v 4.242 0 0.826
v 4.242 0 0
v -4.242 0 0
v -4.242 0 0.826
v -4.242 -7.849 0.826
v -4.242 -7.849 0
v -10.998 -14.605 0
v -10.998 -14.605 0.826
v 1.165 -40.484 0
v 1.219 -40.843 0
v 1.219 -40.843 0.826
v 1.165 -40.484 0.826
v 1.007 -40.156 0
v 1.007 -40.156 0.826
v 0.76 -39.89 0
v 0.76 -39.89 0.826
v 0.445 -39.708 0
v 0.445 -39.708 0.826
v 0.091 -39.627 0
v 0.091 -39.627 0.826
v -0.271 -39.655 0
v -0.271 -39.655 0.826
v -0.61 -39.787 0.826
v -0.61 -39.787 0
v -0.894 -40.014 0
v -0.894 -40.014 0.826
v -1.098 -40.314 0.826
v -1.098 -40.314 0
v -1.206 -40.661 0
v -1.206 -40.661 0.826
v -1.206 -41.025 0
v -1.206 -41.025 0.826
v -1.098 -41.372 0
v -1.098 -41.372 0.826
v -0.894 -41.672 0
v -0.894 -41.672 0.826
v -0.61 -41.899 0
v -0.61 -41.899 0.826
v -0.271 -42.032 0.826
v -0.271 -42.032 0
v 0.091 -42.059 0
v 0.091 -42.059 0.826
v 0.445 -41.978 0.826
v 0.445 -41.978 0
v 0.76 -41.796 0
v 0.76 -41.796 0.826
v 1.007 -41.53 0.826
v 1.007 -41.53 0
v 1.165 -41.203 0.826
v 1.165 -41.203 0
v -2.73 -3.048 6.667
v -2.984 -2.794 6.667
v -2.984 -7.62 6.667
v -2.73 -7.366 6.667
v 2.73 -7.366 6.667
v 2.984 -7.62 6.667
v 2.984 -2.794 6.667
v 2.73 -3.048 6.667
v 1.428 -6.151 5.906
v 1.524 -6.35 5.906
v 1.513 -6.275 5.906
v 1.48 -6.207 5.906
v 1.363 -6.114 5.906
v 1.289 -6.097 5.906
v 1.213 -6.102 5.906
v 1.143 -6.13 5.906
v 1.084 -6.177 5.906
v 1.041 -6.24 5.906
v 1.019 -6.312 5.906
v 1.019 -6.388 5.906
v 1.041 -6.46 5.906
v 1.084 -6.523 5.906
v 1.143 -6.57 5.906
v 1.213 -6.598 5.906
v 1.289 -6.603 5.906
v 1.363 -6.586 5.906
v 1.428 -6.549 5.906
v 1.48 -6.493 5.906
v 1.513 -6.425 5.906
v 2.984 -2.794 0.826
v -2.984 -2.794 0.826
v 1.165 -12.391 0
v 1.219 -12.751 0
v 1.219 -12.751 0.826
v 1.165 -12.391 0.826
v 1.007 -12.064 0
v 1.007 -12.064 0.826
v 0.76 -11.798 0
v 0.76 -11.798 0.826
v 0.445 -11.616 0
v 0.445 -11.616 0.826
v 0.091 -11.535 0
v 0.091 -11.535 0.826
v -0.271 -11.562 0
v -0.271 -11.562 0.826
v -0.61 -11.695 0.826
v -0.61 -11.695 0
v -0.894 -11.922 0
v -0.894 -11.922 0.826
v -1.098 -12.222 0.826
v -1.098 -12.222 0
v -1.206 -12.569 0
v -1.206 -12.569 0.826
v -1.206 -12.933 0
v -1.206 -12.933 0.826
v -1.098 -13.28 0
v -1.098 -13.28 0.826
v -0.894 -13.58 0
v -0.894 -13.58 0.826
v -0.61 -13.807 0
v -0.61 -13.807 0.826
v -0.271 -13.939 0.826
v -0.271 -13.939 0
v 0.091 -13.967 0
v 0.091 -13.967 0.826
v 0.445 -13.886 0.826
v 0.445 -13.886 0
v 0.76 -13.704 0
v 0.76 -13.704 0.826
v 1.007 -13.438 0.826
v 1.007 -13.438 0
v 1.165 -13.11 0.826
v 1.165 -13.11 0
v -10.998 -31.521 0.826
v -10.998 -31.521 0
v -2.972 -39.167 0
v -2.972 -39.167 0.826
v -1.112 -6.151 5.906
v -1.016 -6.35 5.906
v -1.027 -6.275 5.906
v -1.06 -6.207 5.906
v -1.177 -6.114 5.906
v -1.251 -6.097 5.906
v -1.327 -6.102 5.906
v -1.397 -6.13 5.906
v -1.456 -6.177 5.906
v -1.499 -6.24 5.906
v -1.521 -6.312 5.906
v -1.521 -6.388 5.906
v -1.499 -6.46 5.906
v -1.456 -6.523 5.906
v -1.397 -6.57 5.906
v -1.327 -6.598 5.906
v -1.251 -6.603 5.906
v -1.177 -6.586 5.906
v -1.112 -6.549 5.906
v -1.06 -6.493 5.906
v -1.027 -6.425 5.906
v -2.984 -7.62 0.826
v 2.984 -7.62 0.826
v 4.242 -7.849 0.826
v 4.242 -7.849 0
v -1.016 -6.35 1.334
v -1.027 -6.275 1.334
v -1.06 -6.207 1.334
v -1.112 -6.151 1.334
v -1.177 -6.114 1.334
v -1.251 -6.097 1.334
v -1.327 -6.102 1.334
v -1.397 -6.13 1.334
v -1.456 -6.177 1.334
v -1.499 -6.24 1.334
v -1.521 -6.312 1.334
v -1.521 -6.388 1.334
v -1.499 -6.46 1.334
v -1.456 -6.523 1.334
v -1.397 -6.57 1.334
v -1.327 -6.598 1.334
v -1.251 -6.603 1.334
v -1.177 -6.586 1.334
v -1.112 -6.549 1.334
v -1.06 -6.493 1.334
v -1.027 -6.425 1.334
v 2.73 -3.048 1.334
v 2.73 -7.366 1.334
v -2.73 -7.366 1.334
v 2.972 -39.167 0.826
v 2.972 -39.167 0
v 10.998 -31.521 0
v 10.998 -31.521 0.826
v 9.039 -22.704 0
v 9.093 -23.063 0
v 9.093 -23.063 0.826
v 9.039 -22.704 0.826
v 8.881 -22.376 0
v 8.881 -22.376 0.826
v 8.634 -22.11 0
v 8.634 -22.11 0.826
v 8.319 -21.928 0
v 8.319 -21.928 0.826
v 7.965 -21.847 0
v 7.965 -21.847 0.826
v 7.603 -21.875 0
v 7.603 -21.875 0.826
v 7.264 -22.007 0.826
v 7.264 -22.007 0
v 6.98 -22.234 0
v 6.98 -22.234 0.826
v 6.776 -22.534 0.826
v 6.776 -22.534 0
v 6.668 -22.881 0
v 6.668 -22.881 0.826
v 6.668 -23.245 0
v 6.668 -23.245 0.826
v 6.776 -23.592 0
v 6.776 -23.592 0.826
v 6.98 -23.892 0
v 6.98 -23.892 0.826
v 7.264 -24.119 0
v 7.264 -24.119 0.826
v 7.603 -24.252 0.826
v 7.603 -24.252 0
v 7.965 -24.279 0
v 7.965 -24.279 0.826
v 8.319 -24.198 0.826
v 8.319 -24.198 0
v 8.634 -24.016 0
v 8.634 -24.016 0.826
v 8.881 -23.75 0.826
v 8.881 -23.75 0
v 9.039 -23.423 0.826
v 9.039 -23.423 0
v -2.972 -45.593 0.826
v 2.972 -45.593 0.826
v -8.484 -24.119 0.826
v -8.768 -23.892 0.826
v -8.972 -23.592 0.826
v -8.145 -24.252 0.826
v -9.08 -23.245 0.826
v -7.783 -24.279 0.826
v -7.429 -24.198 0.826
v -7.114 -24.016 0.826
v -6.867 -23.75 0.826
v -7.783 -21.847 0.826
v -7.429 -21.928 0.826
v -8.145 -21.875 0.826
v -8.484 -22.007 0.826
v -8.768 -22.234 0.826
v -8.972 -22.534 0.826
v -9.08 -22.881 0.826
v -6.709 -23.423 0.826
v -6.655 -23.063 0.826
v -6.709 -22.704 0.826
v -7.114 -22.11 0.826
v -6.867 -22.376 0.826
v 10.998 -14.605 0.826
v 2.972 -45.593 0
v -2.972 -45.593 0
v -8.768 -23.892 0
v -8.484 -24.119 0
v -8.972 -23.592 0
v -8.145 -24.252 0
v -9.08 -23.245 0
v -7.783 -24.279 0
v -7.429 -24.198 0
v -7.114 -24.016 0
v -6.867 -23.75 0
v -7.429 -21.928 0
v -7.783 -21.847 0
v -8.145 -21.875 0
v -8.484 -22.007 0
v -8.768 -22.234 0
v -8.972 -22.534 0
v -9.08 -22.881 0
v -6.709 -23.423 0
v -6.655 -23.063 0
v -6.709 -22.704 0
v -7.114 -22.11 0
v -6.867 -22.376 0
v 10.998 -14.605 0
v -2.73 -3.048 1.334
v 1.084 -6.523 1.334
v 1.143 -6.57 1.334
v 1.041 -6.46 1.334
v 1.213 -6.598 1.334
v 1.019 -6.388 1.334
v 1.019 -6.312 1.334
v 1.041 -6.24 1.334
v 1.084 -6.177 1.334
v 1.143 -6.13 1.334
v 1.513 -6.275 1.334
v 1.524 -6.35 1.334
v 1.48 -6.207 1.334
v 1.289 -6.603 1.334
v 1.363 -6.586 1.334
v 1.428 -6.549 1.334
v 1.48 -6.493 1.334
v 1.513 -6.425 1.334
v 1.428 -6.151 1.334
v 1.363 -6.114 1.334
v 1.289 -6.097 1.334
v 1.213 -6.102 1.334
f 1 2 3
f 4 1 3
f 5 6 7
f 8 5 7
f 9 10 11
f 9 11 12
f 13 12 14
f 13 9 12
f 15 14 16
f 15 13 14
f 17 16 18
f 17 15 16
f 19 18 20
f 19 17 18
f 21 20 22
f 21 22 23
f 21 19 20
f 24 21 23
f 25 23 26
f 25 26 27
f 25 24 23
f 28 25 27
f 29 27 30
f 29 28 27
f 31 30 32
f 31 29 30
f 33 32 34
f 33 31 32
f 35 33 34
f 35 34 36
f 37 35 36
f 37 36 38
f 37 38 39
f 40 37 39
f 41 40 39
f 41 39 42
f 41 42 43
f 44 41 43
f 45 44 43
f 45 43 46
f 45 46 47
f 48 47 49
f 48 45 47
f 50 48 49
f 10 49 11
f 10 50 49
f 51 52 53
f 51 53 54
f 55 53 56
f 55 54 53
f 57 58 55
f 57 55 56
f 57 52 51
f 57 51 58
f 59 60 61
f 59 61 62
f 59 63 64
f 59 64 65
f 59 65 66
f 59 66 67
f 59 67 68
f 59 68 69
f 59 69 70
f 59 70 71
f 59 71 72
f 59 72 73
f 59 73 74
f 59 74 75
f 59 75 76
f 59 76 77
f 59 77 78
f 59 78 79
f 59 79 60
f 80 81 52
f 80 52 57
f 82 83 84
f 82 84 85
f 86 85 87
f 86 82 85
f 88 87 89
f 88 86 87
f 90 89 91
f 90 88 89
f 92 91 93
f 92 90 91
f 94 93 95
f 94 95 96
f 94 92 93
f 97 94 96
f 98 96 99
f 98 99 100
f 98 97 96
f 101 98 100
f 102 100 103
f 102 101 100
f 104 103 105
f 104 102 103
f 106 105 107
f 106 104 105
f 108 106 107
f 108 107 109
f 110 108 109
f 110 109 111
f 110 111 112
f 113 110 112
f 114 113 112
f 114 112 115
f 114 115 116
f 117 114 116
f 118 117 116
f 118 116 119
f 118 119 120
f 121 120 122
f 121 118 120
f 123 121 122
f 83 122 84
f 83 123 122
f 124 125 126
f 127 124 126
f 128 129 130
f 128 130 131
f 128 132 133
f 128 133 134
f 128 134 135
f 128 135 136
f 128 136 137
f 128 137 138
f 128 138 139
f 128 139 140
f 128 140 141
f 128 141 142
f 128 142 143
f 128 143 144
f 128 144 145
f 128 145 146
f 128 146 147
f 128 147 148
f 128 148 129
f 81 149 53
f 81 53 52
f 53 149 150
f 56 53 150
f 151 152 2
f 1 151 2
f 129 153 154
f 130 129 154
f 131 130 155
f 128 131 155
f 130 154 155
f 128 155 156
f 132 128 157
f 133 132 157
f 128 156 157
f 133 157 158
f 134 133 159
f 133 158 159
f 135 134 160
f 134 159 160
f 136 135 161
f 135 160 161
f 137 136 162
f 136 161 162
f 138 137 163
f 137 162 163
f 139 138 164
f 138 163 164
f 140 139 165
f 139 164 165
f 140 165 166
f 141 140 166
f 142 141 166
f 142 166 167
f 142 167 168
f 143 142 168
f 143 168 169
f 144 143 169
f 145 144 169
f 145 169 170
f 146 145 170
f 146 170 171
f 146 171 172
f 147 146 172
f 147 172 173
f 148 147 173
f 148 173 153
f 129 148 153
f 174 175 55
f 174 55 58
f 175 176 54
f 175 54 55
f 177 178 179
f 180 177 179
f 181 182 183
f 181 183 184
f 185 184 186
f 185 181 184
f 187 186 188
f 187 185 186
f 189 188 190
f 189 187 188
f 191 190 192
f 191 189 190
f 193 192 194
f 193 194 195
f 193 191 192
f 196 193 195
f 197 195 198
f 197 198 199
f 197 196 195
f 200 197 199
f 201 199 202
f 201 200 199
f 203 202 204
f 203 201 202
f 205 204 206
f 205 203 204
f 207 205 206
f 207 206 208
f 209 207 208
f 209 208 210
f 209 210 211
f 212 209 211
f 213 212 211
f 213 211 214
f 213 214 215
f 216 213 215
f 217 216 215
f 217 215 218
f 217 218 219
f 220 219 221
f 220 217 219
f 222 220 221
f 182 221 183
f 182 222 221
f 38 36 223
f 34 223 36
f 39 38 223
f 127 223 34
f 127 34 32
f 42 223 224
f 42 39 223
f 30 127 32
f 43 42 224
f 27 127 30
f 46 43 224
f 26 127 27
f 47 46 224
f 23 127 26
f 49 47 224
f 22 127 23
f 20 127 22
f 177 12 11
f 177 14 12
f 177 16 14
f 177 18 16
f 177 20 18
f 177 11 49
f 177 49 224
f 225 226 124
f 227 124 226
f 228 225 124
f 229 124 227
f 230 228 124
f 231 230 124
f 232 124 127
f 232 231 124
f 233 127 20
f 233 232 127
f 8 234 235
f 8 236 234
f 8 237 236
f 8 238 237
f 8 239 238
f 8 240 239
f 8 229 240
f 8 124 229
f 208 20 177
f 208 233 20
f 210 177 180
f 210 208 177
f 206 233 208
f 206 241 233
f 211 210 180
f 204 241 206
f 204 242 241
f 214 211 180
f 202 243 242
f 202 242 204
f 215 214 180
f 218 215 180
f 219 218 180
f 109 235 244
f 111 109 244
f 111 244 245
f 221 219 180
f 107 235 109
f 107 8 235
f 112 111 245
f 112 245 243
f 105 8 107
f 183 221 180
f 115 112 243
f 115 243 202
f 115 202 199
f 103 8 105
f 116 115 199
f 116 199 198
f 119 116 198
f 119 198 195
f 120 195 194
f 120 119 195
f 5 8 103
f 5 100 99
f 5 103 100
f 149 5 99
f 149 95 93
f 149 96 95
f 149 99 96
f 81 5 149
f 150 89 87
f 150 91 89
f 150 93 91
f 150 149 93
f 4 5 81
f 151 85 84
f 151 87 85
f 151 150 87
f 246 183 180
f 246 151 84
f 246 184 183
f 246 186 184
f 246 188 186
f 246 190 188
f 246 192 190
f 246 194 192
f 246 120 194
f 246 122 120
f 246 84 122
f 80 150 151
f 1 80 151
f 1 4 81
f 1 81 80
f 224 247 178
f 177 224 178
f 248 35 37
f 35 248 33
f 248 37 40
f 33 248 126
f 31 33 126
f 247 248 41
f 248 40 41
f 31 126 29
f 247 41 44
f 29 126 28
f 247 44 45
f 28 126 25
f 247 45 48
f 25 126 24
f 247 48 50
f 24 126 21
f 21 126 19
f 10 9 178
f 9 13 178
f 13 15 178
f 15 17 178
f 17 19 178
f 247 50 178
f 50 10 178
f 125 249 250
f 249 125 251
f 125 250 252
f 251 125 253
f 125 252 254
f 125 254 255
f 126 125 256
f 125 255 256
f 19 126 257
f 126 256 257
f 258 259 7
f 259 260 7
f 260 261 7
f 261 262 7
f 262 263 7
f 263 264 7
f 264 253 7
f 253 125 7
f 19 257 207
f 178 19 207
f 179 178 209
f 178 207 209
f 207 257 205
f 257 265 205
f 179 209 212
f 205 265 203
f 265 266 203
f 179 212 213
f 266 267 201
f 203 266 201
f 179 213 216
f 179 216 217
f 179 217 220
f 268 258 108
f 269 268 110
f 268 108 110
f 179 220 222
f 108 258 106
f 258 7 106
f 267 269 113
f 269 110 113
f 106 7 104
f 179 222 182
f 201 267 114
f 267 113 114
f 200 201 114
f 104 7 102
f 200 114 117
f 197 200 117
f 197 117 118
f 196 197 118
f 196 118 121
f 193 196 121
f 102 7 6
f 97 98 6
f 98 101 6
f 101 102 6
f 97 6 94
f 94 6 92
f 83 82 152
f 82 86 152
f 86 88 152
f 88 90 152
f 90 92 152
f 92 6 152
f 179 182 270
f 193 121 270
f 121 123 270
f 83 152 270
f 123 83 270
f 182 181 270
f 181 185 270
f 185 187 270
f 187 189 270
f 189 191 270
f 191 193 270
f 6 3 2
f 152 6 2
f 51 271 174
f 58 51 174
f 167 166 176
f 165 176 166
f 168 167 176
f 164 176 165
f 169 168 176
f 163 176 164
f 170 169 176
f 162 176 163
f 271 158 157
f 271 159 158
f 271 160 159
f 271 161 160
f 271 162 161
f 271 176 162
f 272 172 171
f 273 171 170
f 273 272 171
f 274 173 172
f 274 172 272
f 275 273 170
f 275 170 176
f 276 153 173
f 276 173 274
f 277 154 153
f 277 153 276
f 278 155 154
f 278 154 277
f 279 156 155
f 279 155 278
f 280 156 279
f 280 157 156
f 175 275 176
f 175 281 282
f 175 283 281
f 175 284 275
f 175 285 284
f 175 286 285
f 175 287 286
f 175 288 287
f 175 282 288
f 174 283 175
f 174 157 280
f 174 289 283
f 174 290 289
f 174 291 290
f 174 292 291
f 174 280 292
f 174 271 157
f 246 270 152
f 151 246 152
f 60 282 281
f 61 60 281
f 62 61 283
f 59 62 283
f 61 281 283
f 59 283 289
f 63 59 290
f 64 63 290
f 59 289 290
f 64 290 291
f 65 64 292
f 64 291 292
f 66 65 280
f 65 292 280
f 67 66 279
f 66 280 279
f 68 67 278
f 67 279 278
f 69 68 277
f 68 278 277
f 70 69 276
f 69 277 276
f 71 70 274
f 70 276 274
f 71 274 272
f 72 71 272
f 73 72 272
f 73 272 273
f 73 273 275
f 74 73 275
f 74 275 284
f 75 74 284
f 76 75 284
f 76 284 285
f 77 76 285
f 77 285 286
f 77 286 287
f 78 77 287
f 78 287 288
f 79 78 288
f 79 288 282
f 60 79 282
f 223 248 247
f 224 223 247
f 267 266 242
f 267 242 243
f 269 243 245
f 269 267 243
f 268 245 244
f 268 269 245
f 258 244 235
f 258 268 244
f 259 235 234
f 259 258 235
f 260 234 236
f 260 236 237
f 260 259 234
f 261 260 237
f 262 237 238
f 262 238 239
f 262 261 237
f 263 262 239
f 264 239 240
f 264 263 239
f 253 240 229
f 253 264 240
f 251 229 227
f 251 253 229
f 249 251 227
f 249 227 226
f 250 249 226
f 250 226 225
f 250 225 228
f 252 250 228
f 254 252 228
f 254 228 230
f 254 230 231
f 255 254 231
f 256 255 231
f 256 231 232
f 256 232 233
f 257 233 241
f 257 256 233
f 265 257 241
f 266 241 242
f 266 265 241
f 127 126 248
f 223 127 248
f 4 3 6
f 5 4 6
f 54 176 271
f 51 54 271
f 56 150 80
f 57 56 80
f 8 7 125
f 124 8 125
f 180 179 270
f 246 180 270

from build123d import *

# Parameters (mm, degrees)
F0_R     = 1.2192
F1_DEPTH = 0.8255
F2_W     = 5.969
F2_H     = 4.826
F2_W_2   = 5.461
F2_H_2   = 4.318
F3_DEPTH = 5.842
F2_R     = 0.254
F4_DEPTH = 0.508
F5_DEPTH = 5.08


with BuildPart() as f1:
    # F0 (on Top) → F1 (new body)
    with BuildSketch(Plane.XY):
        Polygon((4.2418, 0), (-4.2418, 0), (-4.2418, -7.8486), (-10.9982, -14.605), (-10.9982, -31.5214), (-2.9718, -39.1668), (-2.9718, -45.593), (2.9718, -45.593), (2.9718, -39.1668), (10.9982, -31.5214), (10.9982, -14.605), (4.2418, -7.8486), align=None)
        with Locations((-7.874, -23.0632)):
            Circle(F0_R, mode=Mode.SUBTRACT)
        with Locations((0, -40.8432)):
            Circle(F0_R, mode=Mode.SUBTRACT)
        with Locations((7.874, -23.0632)):
            Circle(F0_R, mode=Mode.SUBTRACT)
        with Locations((0, -12.7508)):
            Circle(F0_R, mode=Mode.SUBTRACT)
    extrude(amount=F1_DEPTH)

    # F2 (on face) → F3 (join)
    with BuildSketch(Plane.XY.offset(0.8255)):
        with Locations((0, -5.207)):
            Rectangle(F2_W, F2_H)
        with Locations((0, -5.207)):
            Rectangle(F2_W_2, F2_H_2, mode=Mode.SUBTRACT)
    extrude(amount=F3_DEPTH)

    # F2 (on face) → F4 (join)
    with BuildSketch(Plane.XY.offset(0.8255)):
        with Locations((0, -5.207)):
            Rectangle(F2_W_2, F2_H_2)
        with Locations((-1.27, -6.35)):
            Circle(F2_R, mode=Mode.SUBTRACT)
        with Locations((1.27, -6.35)):
            Circle(F2_R, mode=Mode.SUBTRACT)
    extrude(amount=F4_DEPTH)

    # F2 (on face) → F5 (join)
    with BuildSketch(Plane.XY.offset(0.8255)):
        with Locations((-1.27, -6.35)):
            Circle(F2_R)
        with Locations((1.27, -6.35)):
            Circle(F2_R)
    extrude(amount=F5_DEPTH)


solid = f1.part
